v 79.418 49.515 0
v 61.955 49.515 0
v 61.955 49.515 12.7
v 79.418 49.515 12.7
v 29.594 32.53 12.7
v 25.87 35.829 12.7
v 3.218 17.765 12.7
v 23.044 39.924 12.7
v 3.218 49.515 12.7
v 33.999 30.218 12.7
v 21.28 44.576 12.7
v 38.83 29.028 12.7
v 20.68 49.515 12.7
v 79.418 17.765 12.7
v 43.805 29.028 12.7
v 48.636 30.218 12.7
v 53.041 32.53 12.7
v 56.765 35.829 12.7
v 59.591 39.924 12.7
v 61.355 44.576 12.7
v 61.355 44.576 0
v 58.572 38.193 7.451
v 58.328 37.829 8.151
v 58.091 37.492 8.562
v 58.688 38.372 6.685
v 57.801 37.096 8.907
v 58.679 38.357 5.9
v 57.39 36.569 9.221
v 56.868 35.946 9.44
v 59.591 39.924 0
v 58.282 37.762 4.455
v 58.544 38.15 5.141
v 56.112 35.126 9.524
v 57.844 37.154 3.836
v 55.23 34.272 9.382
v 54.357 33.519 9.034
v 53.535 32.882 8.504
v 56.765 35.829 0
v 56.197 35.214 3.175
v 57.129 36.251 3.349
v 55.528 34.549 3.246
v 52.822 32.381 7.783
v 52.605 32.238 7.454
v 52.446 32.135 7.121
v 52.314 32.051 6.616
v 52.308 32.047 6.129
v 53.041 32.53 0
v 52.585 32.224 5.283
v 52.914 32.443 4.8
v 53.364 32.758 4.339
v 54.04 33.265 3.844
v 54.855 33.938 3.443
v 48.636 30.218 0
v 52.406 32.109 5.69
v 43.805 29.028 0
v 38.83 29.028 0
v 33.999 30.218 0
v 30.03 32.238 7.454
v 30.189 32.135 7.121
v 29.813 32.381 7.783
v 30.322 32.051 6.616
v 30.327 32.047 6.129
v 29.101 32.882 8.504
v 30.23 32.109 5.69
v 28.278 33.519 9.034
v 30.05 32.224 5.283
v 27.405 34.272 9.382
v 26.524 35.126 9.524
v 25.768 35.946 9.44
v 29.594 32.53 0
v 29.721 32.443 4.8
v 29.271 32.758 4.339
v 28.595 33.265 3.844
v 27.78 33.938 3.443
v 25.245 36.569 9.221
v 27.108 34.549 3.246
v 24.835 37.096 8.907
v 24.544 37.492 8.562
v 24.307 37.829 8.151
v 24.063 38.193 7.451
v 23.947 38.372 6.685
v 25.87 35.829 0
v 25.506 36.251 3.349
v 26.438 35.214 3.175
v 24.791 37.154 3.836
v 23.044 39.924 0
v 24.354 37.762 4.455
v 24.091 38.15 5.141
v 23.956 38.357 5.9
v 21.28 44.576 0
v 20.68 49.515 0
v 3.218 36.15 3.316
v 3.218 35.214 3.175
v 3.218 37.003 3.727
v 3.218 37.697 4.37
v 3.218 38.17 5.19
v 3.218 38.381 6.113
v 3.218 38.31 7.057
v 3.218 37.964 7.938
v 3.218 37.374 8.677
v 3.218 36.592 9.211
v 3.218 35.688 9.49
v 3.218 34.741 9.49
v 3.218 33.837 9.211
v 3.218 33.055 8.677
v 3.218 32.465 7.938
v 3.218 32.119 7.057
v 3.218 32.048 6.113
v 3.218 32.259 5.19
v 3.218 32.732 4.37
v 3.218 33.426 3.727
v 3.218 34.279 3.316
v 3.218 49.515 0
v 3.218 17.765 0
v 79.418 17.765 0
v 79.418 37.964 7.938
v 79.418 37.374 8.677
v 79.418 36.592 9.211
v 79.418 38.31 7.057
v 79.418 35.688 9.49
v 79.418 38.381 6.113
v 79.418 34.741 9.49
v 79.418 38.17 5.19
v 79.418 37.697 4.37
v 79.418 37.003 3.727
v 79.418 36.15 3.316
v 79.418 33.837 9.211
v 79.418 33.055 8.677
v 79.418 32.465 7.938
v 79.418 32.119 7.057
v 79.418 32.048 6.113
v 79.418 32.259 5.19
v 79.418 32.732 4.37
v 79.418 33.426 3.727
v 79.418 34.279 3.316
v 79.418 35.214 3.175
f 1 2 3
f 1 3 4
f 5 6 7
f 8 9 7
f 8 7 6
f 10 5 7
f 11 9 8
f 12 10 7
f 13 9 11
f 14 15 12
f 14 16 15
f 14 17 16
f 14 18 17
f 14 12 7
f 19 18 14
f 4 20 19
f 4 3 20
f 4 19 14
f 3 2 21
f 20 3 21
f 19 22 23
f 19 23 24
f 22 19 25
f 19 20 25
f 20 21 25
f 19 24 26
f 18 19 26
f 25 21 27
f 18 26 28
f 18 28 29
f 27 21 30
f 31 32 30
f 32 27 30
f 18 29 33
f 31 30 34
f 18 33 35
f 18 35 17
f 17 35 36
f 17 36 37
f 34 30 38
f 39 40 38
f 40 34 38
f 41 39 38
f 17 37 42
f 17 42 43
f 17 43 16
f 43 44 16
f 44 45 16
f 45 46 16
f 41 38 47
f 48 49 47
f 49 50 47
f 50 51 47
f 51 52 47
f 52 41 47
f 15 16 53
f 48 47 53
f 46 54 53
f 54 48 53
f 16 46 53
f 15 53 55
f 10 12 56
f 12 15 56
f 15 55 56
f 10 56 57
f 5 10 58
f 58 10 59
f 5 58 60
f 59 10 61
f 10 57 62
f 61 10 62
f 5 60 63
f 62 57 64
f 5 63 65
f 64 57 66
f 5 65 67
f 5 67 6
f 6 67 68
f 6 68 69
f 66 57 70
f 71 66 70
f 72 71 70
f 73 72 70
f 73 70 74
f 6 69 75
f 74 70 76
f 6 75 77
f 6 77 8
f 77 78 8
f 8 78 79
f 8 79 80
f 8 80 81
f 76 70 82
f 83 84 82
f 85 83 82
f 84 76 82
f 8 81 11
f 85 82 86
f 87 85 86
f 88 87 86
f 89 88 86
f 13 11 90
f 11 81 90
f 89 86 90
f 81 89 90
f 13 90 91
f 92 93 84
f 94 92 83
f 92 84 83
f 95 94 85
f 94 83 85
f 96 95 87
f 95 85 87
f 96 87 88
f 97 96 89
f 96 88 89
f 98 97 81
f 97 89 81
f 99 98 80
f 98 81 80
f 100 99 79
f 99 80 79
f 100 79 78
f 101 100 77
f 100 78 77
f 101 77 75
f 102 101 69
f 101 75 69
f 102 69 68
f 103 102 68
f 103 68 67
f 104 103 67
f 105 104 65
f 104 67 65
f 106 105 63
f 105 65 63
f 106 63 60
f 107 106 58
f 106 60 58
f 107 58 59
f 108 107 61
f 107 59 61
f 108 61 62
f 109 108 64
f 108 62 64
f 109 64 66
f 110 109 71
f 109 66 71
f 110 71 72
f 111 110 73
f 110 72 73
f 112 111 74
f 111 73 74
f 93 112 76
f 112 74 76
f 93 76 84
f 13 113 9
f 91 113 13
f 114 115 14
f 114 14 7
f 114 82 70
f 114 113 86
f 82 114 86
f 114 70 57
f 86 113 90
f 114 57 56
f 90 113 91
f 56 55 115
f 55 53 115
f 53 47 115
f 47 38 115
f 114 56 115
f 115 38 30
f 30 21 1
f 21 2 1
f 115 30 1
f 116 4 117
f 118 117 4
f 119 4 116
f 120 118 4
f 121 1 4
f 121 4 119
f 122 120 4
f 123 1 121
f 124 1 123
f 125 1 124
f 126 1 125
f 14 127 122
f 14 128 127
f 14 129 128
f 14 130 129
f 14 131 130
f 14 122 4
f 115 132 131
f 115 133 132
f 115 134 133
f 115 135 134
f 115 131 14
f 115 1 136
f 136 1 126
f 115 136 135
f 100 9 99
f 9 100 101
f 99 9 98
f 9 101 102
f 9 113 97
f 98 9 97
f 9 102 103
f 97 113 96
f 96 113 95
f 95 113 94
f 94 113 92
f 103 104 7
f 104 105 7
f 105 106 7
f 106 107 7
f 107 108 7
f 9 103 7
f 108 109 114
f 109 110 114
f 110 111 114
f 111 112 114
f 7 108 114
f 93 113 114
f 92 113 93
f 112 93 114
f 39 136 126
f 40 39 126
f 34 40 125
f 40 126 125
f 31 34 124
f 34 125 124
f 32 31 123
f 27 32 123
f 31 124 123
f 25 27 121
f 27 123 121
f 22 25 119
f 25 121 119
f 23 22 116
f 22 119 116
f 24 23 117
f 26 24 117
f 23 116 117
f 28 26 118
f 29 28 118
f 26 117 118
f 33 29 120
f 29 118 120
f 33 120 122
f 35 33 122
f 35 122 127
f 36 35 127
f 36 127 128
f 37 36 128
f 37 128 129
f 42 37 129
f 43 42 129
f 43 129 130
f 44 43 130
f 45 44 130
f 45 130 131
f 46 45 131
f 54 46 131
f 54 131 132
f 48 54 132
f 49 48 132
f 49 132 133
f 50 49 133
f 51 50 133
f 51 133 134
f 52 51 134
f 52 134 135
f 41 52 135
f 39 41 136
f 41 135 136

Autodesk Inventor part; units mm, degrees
ref_plane "YZ Plane" through (0, 0, 0) normal (1, 0, 0) x (0, 1, 0)
ref_plane "XZ Plane" through (0, 0, 0) normal (0, 1, 0) x (-1, 0, 0)
ref_plane "XY Plane" through (0, 0, 0) normal (0, 0, 1) x (1, 0, 0)
sketch "Sketch1" plane through (0, 0, 0) normal (0, 0, 1) x (1, 0, 0)
  arc A0 (20.6801, 49.5146) -> (61.9551, 49.5146) centre (41.3176, 49.5146) ccw
  line L0 (3.2176, 49.5146) -> (79.4176, 49.5146)
  line L1 (3.2176, 49.5146) -> (3.2176, 17.7646)
  line L2 (79.4176, 49.5146) -> (79.4176, 17.7646)
  line L3 (79.4176, 17.7646) -> (3.2176, 17.7646)
  dimension "d21" = 31.75
  dimension "d22" = 31.75
extrude "Extrusion4" add sketch "Sketch1" along normal blind 12.7 contours A0 L0 L2 L3 L1
sketch "Sketch2" plane through (79.4176, 17.7646, 0) normal (1, 0, 0) x (0, 0, -1)
  line L0 (0, 31.75) -> (-12.7, 31.75) projected
  circle A0 centre (-6.35, 17.4498) radius 3.175
  point P0 (0, -17.7646)
  dimension "d26" = 6.35
extrude "Extrusion5" cut sketch "Sketch2" against normal blind 96.8375
properties part number "Frame Bottom"
